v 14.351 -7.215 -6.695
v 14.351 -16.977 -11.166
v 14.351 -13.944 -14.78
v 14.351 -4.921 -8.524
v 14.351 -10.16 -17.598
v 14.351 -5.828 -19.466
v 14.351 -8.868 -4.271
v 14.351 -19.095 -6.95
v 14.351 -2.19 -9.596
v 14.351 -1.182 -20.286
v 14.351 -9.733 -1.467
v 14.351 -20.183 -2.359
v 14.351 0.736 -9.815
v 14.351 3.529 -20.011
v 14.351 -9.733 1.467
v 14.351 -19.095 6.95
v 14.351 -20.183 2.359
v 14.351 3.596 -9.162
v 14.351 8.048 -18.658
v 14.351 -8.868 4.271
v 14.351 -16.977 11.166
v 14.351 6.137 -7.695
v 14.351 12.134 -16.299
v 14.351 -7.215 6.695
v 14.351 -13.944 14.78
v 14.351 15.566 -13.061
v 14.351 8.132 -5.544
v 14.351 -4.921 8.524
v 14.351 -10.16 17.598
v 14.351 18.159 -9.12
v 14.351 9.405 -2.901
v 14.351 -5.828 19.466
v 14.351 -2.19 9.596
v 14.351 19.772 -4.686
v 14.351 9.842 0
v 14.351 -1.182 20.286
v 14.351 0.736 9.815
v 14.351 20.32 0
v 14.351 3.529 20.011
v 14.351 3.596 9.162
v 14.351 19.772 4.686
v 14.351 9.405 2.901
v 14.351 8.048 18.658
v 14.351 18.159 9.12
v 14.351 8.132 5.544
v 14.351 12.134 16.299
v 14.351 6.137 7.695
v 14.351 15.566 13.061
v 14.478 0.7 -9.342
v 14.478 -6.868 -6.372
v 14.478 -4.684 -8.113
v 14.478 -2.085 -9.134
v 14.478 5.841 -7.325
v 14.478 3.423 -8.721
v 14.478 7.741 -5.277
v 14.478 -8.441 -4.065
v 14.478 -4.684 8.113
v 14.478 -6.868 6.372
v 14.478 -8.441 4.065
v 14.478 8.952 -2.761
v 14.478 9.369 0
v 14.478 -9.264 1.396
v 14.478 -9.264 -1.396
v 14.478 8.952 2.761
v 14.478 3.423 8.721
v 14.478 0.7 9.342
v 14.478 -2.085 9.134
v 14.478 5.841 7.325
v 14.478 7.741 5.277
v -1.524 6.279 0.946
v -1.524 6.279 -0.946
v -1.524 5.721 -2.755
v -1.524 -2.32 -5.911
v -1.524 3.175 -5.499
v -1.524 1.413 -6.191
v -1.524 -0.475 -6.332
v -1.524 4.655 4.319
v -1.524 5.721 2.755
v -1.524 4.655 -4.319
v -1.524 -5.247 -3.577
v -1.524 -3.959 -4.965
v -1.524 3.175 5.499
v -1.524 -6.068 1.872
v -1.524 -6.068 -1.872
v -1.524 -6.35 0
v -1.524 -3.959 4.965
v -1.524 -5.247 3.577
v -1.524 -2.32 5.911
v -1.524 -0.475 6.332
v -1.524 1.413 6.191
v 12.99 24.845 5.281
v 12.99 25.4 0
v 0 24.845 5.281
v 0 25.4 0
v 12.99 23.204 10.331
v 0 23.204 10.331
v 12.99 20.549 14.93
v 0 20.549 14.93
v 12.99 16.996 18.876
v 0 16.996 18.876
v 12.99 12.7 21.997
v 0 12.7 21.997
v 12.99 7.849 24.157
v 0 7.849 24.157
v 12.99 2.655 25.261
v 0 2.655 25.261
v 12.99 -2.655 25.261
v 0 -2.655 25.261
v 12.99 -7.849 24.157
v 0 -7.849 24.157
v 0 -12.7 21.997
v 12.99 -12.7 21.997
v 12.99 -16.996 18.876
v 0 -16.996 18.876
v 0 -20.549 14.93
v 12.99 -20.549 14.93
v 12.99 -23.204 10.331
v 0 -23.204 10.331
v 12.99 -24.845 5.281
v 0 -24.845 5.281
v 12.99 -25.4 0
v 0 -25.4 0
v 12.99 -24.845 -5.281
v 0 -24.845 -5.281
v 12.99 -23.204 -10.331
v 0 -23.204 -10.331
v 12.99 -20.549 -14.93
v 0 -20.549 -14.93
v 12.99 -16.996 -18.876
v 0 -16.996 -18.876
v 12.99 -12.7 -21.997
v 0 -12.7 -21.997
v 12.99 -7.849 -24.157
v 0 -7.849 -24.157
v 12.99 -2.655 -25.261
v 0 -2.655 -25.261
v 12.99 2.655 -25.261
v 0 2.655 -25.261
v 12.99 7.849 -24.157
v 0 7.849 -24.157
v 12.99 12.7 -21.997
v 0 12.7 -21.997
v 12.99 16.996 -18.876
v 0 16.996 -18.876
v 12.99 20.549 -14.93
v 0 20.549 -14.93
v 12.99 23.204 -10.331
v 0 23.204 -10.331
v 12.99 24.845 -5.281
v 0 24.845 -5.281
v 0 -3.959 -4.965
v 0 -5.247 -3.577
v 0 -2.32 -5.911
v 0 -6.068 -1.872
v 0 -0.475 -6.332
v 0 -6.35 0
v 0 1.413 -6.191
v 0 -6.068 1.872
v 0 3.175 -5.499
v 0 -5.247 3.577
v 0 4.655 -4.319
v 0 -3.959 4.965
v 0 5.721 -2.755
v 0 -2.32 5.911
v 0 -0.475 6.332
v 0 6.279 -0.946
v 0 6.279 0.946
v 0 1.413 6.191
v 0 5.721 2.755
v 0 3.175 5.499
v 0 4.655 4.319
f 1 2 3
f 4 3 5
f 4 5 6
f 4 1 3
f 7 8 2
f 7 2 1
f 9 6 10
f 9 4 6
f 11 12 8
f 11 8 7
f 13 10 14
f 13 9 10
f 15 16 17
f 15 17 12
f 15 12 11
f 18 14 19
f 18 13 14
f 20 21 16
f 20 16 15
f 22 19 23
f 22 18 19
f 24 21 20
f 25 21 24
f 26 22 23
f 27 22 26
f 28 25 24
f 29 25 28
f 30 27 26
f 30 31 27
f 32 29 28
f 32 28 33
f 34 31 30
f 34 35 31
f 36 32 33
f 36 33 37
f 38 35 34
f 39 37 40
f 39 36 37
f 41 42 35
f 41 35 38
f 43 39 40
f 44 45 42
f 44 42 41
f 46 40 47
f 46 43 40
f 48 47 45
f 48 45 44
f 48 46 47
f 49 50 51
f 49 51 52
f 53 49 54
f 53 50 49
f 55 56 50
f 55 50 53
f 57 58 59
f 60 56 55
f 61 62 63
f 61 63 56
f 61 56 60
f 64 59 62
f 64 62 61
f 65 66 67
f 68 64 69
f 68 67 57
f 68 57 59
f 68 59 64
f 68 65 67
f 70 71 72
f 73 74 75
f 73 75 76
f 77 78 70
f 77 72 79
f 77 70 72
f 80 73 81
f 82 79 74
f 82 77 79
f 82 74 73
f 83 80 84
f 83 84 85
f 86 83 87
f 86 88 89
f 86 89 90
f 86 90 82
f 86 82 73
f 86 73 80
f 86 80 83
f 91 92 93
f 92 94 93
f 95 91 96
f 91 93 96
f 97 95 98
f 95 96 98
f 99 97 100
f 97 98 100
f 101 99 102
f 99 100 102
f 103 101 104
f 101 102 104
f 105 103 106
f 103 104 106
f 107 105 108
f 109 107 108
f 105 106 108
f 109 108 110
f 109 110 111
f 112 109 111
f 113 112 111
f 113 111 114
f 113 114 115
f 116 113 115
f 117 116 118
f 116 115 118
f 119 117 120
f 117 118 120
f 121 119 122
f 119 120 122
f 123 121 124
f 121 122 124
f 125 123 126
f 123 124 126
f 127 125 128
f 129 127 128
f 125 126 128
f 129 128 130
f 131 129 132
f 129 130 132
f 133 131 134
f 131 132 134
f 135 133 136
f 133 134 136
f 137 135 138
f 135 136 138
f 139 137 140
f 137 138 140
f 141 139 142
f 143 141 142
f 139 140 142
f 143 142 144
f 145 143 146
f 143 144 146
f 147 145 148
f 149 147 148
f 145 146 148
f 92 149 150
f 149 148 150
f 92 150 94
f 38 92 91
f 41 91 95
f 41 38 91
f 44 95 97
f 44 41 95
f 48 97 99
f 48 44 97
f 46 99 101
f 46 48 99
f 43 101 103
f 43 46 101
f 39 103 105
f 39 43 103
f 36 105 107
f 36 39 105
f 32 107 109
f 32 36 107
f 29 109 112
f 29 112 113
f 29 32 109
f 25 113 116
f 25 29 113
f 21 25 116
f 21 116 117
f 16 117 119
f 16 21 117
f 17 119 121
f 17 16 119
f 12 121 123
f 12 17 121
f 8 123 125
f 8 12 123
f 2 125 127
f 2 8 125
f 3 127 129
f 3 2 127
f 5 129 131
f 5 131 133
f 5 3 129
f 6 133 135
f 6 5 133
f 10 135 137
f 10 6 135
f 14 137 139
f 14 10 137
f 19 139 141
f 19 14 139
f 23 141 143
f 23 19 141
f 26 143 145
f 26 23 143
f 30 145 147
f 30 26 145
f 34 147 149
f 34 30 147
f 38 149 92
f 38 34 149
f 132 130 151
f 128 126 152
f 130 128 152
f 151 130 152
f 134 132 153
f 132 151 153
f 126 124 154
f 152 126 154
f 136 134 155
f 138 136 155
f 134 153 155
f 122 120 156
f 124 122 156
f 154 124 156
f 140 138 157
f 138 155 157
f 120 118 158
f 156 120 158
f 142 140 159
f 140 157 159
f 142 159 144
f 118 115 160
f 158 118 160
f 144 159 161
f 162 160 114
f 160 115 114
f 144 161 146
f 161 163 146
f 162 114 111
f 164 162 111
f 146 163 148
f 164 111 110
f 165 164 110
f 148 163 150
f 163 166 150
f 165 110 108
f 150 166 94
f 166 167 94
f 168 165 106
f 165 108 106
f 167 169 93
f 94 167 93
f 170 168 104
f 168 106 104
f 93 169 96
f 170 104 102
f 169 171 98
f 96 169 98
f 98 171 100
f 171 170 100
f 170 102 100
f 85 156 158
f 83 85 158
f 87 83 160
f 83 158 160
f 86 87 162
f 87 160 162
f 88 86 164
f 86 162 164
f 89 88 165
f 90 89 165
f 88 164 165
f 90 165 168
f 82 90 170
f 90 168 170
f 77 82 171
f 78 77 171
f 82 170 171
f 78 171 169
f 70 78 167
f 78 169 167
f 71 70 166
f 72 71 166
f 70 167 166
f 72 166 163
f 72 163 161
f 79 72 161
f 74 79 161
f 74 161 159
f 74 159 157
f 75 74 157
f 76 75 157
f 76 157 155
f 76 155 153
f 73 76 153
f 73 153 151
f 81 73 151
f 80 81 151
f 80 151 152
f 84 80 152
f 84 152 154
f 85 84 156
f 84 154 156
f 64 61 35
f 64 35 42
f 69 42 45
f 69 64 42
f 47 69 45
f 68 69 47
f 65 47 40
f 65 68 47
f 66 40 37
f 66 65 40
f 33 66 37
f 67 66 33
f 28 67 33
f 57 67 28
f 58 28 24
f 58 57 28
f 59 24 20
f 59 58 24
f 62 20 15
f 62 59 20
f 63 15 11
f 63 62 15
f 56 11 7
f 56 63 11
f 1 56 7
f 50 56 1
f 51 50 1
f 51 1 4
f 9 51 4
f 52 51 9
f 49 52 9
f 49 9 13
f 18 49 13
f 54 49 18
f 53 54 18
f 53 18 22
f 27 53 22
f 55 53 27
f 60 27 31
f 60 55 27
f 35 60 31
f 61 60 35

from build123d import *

# Parameters (mm, degrees)
F0_R     = 25.4
F1_DEPTH = 9.652
F2_R     = 4.7625
F3_DEPTH = 4.826
F4_DEPTH = 4.699
F6_DEPTH = 3.175
F7_R     = 6.35
F8_DEPTH = 1.524


# Not quite as in the source:
# - a fillet or chamfer that OpenCascade refuses, or shapes differently, is made with other operations: its cross-section is extruded or revolved along the edge and cut away or added


with BuildPart() as f1:
    # F0 (on Right) → F1 (new body)
    with BuildSketch(Plane.YZ):
        Circle(F0_R)
    extrude(amount=F1_DEPTH)

    # F2 (on face) → F3 (join)
    with BuildSketch(Plane.YZ.offset(9.652)):
        Circle(F2_R)
    extrude(amount=F3_DEPTH)

    # F4 (add): a face of the model
    f4_faces = [f1.faces().sort_by_distance(p)[0] for p in [
        (9.652, -24.6815795103, 0),
    ]]
    extrude(f4_faces, amount=F4_DEPTH)

    # F5: chamfer of 5.08 x 1.3611818976 on 2 edges, made by hand


with BuildPart() as f5_tool2:
    # F5_s3 → F5_t4 (revolve)
    with BuildSketch(Plane.XY):
        Polygon((14.351, 9.8425), (15.7121818976, 4.7625), (14.351, 4.7625), align=None)
    revolve(axis=Axis((14.351, 0, 0), (1, 0, 0)))

    split(bisect_by=Plane.YZ.offset(14.478), keep=Keep.BOTTOM)


with BuildPart() as f1_1:
    add(f1.part)

    # F5_t1: union F5_tool2
    add(f5_tool2.part)

    # F5_s6 → F5_t7 (revolve, cut)
    with BuildSketch(Plane.XY):
        Polygon((12.9898181024, 25.4), (14.351, 20.32), (14.351, 25.4), align=None)
    revolve(axis=Axis((14.351, 0, 0), (1, 0, 0)), mode=Mode.SUBTRACT)

    # F6 (cut): a face of the model
    f6_faces = [f1_1.faces().sort_by_distance(p)[0] for p in [
        (0, 0, 0),
    ]]
    extrude(f6_faces, amount=F6_DEPTH, mode=Mode.SUBTRACT)

    # F7 (on face) → F8 (join)
    with BuildSketch(Plane(origin=(0, 0, 0), x_dir=(0, -1, 0), z_dir=(-1, 0, 0))):
        Circle(F7_R)
    extrude(amount=F8_DEPTH)


solid = f1_1.part
